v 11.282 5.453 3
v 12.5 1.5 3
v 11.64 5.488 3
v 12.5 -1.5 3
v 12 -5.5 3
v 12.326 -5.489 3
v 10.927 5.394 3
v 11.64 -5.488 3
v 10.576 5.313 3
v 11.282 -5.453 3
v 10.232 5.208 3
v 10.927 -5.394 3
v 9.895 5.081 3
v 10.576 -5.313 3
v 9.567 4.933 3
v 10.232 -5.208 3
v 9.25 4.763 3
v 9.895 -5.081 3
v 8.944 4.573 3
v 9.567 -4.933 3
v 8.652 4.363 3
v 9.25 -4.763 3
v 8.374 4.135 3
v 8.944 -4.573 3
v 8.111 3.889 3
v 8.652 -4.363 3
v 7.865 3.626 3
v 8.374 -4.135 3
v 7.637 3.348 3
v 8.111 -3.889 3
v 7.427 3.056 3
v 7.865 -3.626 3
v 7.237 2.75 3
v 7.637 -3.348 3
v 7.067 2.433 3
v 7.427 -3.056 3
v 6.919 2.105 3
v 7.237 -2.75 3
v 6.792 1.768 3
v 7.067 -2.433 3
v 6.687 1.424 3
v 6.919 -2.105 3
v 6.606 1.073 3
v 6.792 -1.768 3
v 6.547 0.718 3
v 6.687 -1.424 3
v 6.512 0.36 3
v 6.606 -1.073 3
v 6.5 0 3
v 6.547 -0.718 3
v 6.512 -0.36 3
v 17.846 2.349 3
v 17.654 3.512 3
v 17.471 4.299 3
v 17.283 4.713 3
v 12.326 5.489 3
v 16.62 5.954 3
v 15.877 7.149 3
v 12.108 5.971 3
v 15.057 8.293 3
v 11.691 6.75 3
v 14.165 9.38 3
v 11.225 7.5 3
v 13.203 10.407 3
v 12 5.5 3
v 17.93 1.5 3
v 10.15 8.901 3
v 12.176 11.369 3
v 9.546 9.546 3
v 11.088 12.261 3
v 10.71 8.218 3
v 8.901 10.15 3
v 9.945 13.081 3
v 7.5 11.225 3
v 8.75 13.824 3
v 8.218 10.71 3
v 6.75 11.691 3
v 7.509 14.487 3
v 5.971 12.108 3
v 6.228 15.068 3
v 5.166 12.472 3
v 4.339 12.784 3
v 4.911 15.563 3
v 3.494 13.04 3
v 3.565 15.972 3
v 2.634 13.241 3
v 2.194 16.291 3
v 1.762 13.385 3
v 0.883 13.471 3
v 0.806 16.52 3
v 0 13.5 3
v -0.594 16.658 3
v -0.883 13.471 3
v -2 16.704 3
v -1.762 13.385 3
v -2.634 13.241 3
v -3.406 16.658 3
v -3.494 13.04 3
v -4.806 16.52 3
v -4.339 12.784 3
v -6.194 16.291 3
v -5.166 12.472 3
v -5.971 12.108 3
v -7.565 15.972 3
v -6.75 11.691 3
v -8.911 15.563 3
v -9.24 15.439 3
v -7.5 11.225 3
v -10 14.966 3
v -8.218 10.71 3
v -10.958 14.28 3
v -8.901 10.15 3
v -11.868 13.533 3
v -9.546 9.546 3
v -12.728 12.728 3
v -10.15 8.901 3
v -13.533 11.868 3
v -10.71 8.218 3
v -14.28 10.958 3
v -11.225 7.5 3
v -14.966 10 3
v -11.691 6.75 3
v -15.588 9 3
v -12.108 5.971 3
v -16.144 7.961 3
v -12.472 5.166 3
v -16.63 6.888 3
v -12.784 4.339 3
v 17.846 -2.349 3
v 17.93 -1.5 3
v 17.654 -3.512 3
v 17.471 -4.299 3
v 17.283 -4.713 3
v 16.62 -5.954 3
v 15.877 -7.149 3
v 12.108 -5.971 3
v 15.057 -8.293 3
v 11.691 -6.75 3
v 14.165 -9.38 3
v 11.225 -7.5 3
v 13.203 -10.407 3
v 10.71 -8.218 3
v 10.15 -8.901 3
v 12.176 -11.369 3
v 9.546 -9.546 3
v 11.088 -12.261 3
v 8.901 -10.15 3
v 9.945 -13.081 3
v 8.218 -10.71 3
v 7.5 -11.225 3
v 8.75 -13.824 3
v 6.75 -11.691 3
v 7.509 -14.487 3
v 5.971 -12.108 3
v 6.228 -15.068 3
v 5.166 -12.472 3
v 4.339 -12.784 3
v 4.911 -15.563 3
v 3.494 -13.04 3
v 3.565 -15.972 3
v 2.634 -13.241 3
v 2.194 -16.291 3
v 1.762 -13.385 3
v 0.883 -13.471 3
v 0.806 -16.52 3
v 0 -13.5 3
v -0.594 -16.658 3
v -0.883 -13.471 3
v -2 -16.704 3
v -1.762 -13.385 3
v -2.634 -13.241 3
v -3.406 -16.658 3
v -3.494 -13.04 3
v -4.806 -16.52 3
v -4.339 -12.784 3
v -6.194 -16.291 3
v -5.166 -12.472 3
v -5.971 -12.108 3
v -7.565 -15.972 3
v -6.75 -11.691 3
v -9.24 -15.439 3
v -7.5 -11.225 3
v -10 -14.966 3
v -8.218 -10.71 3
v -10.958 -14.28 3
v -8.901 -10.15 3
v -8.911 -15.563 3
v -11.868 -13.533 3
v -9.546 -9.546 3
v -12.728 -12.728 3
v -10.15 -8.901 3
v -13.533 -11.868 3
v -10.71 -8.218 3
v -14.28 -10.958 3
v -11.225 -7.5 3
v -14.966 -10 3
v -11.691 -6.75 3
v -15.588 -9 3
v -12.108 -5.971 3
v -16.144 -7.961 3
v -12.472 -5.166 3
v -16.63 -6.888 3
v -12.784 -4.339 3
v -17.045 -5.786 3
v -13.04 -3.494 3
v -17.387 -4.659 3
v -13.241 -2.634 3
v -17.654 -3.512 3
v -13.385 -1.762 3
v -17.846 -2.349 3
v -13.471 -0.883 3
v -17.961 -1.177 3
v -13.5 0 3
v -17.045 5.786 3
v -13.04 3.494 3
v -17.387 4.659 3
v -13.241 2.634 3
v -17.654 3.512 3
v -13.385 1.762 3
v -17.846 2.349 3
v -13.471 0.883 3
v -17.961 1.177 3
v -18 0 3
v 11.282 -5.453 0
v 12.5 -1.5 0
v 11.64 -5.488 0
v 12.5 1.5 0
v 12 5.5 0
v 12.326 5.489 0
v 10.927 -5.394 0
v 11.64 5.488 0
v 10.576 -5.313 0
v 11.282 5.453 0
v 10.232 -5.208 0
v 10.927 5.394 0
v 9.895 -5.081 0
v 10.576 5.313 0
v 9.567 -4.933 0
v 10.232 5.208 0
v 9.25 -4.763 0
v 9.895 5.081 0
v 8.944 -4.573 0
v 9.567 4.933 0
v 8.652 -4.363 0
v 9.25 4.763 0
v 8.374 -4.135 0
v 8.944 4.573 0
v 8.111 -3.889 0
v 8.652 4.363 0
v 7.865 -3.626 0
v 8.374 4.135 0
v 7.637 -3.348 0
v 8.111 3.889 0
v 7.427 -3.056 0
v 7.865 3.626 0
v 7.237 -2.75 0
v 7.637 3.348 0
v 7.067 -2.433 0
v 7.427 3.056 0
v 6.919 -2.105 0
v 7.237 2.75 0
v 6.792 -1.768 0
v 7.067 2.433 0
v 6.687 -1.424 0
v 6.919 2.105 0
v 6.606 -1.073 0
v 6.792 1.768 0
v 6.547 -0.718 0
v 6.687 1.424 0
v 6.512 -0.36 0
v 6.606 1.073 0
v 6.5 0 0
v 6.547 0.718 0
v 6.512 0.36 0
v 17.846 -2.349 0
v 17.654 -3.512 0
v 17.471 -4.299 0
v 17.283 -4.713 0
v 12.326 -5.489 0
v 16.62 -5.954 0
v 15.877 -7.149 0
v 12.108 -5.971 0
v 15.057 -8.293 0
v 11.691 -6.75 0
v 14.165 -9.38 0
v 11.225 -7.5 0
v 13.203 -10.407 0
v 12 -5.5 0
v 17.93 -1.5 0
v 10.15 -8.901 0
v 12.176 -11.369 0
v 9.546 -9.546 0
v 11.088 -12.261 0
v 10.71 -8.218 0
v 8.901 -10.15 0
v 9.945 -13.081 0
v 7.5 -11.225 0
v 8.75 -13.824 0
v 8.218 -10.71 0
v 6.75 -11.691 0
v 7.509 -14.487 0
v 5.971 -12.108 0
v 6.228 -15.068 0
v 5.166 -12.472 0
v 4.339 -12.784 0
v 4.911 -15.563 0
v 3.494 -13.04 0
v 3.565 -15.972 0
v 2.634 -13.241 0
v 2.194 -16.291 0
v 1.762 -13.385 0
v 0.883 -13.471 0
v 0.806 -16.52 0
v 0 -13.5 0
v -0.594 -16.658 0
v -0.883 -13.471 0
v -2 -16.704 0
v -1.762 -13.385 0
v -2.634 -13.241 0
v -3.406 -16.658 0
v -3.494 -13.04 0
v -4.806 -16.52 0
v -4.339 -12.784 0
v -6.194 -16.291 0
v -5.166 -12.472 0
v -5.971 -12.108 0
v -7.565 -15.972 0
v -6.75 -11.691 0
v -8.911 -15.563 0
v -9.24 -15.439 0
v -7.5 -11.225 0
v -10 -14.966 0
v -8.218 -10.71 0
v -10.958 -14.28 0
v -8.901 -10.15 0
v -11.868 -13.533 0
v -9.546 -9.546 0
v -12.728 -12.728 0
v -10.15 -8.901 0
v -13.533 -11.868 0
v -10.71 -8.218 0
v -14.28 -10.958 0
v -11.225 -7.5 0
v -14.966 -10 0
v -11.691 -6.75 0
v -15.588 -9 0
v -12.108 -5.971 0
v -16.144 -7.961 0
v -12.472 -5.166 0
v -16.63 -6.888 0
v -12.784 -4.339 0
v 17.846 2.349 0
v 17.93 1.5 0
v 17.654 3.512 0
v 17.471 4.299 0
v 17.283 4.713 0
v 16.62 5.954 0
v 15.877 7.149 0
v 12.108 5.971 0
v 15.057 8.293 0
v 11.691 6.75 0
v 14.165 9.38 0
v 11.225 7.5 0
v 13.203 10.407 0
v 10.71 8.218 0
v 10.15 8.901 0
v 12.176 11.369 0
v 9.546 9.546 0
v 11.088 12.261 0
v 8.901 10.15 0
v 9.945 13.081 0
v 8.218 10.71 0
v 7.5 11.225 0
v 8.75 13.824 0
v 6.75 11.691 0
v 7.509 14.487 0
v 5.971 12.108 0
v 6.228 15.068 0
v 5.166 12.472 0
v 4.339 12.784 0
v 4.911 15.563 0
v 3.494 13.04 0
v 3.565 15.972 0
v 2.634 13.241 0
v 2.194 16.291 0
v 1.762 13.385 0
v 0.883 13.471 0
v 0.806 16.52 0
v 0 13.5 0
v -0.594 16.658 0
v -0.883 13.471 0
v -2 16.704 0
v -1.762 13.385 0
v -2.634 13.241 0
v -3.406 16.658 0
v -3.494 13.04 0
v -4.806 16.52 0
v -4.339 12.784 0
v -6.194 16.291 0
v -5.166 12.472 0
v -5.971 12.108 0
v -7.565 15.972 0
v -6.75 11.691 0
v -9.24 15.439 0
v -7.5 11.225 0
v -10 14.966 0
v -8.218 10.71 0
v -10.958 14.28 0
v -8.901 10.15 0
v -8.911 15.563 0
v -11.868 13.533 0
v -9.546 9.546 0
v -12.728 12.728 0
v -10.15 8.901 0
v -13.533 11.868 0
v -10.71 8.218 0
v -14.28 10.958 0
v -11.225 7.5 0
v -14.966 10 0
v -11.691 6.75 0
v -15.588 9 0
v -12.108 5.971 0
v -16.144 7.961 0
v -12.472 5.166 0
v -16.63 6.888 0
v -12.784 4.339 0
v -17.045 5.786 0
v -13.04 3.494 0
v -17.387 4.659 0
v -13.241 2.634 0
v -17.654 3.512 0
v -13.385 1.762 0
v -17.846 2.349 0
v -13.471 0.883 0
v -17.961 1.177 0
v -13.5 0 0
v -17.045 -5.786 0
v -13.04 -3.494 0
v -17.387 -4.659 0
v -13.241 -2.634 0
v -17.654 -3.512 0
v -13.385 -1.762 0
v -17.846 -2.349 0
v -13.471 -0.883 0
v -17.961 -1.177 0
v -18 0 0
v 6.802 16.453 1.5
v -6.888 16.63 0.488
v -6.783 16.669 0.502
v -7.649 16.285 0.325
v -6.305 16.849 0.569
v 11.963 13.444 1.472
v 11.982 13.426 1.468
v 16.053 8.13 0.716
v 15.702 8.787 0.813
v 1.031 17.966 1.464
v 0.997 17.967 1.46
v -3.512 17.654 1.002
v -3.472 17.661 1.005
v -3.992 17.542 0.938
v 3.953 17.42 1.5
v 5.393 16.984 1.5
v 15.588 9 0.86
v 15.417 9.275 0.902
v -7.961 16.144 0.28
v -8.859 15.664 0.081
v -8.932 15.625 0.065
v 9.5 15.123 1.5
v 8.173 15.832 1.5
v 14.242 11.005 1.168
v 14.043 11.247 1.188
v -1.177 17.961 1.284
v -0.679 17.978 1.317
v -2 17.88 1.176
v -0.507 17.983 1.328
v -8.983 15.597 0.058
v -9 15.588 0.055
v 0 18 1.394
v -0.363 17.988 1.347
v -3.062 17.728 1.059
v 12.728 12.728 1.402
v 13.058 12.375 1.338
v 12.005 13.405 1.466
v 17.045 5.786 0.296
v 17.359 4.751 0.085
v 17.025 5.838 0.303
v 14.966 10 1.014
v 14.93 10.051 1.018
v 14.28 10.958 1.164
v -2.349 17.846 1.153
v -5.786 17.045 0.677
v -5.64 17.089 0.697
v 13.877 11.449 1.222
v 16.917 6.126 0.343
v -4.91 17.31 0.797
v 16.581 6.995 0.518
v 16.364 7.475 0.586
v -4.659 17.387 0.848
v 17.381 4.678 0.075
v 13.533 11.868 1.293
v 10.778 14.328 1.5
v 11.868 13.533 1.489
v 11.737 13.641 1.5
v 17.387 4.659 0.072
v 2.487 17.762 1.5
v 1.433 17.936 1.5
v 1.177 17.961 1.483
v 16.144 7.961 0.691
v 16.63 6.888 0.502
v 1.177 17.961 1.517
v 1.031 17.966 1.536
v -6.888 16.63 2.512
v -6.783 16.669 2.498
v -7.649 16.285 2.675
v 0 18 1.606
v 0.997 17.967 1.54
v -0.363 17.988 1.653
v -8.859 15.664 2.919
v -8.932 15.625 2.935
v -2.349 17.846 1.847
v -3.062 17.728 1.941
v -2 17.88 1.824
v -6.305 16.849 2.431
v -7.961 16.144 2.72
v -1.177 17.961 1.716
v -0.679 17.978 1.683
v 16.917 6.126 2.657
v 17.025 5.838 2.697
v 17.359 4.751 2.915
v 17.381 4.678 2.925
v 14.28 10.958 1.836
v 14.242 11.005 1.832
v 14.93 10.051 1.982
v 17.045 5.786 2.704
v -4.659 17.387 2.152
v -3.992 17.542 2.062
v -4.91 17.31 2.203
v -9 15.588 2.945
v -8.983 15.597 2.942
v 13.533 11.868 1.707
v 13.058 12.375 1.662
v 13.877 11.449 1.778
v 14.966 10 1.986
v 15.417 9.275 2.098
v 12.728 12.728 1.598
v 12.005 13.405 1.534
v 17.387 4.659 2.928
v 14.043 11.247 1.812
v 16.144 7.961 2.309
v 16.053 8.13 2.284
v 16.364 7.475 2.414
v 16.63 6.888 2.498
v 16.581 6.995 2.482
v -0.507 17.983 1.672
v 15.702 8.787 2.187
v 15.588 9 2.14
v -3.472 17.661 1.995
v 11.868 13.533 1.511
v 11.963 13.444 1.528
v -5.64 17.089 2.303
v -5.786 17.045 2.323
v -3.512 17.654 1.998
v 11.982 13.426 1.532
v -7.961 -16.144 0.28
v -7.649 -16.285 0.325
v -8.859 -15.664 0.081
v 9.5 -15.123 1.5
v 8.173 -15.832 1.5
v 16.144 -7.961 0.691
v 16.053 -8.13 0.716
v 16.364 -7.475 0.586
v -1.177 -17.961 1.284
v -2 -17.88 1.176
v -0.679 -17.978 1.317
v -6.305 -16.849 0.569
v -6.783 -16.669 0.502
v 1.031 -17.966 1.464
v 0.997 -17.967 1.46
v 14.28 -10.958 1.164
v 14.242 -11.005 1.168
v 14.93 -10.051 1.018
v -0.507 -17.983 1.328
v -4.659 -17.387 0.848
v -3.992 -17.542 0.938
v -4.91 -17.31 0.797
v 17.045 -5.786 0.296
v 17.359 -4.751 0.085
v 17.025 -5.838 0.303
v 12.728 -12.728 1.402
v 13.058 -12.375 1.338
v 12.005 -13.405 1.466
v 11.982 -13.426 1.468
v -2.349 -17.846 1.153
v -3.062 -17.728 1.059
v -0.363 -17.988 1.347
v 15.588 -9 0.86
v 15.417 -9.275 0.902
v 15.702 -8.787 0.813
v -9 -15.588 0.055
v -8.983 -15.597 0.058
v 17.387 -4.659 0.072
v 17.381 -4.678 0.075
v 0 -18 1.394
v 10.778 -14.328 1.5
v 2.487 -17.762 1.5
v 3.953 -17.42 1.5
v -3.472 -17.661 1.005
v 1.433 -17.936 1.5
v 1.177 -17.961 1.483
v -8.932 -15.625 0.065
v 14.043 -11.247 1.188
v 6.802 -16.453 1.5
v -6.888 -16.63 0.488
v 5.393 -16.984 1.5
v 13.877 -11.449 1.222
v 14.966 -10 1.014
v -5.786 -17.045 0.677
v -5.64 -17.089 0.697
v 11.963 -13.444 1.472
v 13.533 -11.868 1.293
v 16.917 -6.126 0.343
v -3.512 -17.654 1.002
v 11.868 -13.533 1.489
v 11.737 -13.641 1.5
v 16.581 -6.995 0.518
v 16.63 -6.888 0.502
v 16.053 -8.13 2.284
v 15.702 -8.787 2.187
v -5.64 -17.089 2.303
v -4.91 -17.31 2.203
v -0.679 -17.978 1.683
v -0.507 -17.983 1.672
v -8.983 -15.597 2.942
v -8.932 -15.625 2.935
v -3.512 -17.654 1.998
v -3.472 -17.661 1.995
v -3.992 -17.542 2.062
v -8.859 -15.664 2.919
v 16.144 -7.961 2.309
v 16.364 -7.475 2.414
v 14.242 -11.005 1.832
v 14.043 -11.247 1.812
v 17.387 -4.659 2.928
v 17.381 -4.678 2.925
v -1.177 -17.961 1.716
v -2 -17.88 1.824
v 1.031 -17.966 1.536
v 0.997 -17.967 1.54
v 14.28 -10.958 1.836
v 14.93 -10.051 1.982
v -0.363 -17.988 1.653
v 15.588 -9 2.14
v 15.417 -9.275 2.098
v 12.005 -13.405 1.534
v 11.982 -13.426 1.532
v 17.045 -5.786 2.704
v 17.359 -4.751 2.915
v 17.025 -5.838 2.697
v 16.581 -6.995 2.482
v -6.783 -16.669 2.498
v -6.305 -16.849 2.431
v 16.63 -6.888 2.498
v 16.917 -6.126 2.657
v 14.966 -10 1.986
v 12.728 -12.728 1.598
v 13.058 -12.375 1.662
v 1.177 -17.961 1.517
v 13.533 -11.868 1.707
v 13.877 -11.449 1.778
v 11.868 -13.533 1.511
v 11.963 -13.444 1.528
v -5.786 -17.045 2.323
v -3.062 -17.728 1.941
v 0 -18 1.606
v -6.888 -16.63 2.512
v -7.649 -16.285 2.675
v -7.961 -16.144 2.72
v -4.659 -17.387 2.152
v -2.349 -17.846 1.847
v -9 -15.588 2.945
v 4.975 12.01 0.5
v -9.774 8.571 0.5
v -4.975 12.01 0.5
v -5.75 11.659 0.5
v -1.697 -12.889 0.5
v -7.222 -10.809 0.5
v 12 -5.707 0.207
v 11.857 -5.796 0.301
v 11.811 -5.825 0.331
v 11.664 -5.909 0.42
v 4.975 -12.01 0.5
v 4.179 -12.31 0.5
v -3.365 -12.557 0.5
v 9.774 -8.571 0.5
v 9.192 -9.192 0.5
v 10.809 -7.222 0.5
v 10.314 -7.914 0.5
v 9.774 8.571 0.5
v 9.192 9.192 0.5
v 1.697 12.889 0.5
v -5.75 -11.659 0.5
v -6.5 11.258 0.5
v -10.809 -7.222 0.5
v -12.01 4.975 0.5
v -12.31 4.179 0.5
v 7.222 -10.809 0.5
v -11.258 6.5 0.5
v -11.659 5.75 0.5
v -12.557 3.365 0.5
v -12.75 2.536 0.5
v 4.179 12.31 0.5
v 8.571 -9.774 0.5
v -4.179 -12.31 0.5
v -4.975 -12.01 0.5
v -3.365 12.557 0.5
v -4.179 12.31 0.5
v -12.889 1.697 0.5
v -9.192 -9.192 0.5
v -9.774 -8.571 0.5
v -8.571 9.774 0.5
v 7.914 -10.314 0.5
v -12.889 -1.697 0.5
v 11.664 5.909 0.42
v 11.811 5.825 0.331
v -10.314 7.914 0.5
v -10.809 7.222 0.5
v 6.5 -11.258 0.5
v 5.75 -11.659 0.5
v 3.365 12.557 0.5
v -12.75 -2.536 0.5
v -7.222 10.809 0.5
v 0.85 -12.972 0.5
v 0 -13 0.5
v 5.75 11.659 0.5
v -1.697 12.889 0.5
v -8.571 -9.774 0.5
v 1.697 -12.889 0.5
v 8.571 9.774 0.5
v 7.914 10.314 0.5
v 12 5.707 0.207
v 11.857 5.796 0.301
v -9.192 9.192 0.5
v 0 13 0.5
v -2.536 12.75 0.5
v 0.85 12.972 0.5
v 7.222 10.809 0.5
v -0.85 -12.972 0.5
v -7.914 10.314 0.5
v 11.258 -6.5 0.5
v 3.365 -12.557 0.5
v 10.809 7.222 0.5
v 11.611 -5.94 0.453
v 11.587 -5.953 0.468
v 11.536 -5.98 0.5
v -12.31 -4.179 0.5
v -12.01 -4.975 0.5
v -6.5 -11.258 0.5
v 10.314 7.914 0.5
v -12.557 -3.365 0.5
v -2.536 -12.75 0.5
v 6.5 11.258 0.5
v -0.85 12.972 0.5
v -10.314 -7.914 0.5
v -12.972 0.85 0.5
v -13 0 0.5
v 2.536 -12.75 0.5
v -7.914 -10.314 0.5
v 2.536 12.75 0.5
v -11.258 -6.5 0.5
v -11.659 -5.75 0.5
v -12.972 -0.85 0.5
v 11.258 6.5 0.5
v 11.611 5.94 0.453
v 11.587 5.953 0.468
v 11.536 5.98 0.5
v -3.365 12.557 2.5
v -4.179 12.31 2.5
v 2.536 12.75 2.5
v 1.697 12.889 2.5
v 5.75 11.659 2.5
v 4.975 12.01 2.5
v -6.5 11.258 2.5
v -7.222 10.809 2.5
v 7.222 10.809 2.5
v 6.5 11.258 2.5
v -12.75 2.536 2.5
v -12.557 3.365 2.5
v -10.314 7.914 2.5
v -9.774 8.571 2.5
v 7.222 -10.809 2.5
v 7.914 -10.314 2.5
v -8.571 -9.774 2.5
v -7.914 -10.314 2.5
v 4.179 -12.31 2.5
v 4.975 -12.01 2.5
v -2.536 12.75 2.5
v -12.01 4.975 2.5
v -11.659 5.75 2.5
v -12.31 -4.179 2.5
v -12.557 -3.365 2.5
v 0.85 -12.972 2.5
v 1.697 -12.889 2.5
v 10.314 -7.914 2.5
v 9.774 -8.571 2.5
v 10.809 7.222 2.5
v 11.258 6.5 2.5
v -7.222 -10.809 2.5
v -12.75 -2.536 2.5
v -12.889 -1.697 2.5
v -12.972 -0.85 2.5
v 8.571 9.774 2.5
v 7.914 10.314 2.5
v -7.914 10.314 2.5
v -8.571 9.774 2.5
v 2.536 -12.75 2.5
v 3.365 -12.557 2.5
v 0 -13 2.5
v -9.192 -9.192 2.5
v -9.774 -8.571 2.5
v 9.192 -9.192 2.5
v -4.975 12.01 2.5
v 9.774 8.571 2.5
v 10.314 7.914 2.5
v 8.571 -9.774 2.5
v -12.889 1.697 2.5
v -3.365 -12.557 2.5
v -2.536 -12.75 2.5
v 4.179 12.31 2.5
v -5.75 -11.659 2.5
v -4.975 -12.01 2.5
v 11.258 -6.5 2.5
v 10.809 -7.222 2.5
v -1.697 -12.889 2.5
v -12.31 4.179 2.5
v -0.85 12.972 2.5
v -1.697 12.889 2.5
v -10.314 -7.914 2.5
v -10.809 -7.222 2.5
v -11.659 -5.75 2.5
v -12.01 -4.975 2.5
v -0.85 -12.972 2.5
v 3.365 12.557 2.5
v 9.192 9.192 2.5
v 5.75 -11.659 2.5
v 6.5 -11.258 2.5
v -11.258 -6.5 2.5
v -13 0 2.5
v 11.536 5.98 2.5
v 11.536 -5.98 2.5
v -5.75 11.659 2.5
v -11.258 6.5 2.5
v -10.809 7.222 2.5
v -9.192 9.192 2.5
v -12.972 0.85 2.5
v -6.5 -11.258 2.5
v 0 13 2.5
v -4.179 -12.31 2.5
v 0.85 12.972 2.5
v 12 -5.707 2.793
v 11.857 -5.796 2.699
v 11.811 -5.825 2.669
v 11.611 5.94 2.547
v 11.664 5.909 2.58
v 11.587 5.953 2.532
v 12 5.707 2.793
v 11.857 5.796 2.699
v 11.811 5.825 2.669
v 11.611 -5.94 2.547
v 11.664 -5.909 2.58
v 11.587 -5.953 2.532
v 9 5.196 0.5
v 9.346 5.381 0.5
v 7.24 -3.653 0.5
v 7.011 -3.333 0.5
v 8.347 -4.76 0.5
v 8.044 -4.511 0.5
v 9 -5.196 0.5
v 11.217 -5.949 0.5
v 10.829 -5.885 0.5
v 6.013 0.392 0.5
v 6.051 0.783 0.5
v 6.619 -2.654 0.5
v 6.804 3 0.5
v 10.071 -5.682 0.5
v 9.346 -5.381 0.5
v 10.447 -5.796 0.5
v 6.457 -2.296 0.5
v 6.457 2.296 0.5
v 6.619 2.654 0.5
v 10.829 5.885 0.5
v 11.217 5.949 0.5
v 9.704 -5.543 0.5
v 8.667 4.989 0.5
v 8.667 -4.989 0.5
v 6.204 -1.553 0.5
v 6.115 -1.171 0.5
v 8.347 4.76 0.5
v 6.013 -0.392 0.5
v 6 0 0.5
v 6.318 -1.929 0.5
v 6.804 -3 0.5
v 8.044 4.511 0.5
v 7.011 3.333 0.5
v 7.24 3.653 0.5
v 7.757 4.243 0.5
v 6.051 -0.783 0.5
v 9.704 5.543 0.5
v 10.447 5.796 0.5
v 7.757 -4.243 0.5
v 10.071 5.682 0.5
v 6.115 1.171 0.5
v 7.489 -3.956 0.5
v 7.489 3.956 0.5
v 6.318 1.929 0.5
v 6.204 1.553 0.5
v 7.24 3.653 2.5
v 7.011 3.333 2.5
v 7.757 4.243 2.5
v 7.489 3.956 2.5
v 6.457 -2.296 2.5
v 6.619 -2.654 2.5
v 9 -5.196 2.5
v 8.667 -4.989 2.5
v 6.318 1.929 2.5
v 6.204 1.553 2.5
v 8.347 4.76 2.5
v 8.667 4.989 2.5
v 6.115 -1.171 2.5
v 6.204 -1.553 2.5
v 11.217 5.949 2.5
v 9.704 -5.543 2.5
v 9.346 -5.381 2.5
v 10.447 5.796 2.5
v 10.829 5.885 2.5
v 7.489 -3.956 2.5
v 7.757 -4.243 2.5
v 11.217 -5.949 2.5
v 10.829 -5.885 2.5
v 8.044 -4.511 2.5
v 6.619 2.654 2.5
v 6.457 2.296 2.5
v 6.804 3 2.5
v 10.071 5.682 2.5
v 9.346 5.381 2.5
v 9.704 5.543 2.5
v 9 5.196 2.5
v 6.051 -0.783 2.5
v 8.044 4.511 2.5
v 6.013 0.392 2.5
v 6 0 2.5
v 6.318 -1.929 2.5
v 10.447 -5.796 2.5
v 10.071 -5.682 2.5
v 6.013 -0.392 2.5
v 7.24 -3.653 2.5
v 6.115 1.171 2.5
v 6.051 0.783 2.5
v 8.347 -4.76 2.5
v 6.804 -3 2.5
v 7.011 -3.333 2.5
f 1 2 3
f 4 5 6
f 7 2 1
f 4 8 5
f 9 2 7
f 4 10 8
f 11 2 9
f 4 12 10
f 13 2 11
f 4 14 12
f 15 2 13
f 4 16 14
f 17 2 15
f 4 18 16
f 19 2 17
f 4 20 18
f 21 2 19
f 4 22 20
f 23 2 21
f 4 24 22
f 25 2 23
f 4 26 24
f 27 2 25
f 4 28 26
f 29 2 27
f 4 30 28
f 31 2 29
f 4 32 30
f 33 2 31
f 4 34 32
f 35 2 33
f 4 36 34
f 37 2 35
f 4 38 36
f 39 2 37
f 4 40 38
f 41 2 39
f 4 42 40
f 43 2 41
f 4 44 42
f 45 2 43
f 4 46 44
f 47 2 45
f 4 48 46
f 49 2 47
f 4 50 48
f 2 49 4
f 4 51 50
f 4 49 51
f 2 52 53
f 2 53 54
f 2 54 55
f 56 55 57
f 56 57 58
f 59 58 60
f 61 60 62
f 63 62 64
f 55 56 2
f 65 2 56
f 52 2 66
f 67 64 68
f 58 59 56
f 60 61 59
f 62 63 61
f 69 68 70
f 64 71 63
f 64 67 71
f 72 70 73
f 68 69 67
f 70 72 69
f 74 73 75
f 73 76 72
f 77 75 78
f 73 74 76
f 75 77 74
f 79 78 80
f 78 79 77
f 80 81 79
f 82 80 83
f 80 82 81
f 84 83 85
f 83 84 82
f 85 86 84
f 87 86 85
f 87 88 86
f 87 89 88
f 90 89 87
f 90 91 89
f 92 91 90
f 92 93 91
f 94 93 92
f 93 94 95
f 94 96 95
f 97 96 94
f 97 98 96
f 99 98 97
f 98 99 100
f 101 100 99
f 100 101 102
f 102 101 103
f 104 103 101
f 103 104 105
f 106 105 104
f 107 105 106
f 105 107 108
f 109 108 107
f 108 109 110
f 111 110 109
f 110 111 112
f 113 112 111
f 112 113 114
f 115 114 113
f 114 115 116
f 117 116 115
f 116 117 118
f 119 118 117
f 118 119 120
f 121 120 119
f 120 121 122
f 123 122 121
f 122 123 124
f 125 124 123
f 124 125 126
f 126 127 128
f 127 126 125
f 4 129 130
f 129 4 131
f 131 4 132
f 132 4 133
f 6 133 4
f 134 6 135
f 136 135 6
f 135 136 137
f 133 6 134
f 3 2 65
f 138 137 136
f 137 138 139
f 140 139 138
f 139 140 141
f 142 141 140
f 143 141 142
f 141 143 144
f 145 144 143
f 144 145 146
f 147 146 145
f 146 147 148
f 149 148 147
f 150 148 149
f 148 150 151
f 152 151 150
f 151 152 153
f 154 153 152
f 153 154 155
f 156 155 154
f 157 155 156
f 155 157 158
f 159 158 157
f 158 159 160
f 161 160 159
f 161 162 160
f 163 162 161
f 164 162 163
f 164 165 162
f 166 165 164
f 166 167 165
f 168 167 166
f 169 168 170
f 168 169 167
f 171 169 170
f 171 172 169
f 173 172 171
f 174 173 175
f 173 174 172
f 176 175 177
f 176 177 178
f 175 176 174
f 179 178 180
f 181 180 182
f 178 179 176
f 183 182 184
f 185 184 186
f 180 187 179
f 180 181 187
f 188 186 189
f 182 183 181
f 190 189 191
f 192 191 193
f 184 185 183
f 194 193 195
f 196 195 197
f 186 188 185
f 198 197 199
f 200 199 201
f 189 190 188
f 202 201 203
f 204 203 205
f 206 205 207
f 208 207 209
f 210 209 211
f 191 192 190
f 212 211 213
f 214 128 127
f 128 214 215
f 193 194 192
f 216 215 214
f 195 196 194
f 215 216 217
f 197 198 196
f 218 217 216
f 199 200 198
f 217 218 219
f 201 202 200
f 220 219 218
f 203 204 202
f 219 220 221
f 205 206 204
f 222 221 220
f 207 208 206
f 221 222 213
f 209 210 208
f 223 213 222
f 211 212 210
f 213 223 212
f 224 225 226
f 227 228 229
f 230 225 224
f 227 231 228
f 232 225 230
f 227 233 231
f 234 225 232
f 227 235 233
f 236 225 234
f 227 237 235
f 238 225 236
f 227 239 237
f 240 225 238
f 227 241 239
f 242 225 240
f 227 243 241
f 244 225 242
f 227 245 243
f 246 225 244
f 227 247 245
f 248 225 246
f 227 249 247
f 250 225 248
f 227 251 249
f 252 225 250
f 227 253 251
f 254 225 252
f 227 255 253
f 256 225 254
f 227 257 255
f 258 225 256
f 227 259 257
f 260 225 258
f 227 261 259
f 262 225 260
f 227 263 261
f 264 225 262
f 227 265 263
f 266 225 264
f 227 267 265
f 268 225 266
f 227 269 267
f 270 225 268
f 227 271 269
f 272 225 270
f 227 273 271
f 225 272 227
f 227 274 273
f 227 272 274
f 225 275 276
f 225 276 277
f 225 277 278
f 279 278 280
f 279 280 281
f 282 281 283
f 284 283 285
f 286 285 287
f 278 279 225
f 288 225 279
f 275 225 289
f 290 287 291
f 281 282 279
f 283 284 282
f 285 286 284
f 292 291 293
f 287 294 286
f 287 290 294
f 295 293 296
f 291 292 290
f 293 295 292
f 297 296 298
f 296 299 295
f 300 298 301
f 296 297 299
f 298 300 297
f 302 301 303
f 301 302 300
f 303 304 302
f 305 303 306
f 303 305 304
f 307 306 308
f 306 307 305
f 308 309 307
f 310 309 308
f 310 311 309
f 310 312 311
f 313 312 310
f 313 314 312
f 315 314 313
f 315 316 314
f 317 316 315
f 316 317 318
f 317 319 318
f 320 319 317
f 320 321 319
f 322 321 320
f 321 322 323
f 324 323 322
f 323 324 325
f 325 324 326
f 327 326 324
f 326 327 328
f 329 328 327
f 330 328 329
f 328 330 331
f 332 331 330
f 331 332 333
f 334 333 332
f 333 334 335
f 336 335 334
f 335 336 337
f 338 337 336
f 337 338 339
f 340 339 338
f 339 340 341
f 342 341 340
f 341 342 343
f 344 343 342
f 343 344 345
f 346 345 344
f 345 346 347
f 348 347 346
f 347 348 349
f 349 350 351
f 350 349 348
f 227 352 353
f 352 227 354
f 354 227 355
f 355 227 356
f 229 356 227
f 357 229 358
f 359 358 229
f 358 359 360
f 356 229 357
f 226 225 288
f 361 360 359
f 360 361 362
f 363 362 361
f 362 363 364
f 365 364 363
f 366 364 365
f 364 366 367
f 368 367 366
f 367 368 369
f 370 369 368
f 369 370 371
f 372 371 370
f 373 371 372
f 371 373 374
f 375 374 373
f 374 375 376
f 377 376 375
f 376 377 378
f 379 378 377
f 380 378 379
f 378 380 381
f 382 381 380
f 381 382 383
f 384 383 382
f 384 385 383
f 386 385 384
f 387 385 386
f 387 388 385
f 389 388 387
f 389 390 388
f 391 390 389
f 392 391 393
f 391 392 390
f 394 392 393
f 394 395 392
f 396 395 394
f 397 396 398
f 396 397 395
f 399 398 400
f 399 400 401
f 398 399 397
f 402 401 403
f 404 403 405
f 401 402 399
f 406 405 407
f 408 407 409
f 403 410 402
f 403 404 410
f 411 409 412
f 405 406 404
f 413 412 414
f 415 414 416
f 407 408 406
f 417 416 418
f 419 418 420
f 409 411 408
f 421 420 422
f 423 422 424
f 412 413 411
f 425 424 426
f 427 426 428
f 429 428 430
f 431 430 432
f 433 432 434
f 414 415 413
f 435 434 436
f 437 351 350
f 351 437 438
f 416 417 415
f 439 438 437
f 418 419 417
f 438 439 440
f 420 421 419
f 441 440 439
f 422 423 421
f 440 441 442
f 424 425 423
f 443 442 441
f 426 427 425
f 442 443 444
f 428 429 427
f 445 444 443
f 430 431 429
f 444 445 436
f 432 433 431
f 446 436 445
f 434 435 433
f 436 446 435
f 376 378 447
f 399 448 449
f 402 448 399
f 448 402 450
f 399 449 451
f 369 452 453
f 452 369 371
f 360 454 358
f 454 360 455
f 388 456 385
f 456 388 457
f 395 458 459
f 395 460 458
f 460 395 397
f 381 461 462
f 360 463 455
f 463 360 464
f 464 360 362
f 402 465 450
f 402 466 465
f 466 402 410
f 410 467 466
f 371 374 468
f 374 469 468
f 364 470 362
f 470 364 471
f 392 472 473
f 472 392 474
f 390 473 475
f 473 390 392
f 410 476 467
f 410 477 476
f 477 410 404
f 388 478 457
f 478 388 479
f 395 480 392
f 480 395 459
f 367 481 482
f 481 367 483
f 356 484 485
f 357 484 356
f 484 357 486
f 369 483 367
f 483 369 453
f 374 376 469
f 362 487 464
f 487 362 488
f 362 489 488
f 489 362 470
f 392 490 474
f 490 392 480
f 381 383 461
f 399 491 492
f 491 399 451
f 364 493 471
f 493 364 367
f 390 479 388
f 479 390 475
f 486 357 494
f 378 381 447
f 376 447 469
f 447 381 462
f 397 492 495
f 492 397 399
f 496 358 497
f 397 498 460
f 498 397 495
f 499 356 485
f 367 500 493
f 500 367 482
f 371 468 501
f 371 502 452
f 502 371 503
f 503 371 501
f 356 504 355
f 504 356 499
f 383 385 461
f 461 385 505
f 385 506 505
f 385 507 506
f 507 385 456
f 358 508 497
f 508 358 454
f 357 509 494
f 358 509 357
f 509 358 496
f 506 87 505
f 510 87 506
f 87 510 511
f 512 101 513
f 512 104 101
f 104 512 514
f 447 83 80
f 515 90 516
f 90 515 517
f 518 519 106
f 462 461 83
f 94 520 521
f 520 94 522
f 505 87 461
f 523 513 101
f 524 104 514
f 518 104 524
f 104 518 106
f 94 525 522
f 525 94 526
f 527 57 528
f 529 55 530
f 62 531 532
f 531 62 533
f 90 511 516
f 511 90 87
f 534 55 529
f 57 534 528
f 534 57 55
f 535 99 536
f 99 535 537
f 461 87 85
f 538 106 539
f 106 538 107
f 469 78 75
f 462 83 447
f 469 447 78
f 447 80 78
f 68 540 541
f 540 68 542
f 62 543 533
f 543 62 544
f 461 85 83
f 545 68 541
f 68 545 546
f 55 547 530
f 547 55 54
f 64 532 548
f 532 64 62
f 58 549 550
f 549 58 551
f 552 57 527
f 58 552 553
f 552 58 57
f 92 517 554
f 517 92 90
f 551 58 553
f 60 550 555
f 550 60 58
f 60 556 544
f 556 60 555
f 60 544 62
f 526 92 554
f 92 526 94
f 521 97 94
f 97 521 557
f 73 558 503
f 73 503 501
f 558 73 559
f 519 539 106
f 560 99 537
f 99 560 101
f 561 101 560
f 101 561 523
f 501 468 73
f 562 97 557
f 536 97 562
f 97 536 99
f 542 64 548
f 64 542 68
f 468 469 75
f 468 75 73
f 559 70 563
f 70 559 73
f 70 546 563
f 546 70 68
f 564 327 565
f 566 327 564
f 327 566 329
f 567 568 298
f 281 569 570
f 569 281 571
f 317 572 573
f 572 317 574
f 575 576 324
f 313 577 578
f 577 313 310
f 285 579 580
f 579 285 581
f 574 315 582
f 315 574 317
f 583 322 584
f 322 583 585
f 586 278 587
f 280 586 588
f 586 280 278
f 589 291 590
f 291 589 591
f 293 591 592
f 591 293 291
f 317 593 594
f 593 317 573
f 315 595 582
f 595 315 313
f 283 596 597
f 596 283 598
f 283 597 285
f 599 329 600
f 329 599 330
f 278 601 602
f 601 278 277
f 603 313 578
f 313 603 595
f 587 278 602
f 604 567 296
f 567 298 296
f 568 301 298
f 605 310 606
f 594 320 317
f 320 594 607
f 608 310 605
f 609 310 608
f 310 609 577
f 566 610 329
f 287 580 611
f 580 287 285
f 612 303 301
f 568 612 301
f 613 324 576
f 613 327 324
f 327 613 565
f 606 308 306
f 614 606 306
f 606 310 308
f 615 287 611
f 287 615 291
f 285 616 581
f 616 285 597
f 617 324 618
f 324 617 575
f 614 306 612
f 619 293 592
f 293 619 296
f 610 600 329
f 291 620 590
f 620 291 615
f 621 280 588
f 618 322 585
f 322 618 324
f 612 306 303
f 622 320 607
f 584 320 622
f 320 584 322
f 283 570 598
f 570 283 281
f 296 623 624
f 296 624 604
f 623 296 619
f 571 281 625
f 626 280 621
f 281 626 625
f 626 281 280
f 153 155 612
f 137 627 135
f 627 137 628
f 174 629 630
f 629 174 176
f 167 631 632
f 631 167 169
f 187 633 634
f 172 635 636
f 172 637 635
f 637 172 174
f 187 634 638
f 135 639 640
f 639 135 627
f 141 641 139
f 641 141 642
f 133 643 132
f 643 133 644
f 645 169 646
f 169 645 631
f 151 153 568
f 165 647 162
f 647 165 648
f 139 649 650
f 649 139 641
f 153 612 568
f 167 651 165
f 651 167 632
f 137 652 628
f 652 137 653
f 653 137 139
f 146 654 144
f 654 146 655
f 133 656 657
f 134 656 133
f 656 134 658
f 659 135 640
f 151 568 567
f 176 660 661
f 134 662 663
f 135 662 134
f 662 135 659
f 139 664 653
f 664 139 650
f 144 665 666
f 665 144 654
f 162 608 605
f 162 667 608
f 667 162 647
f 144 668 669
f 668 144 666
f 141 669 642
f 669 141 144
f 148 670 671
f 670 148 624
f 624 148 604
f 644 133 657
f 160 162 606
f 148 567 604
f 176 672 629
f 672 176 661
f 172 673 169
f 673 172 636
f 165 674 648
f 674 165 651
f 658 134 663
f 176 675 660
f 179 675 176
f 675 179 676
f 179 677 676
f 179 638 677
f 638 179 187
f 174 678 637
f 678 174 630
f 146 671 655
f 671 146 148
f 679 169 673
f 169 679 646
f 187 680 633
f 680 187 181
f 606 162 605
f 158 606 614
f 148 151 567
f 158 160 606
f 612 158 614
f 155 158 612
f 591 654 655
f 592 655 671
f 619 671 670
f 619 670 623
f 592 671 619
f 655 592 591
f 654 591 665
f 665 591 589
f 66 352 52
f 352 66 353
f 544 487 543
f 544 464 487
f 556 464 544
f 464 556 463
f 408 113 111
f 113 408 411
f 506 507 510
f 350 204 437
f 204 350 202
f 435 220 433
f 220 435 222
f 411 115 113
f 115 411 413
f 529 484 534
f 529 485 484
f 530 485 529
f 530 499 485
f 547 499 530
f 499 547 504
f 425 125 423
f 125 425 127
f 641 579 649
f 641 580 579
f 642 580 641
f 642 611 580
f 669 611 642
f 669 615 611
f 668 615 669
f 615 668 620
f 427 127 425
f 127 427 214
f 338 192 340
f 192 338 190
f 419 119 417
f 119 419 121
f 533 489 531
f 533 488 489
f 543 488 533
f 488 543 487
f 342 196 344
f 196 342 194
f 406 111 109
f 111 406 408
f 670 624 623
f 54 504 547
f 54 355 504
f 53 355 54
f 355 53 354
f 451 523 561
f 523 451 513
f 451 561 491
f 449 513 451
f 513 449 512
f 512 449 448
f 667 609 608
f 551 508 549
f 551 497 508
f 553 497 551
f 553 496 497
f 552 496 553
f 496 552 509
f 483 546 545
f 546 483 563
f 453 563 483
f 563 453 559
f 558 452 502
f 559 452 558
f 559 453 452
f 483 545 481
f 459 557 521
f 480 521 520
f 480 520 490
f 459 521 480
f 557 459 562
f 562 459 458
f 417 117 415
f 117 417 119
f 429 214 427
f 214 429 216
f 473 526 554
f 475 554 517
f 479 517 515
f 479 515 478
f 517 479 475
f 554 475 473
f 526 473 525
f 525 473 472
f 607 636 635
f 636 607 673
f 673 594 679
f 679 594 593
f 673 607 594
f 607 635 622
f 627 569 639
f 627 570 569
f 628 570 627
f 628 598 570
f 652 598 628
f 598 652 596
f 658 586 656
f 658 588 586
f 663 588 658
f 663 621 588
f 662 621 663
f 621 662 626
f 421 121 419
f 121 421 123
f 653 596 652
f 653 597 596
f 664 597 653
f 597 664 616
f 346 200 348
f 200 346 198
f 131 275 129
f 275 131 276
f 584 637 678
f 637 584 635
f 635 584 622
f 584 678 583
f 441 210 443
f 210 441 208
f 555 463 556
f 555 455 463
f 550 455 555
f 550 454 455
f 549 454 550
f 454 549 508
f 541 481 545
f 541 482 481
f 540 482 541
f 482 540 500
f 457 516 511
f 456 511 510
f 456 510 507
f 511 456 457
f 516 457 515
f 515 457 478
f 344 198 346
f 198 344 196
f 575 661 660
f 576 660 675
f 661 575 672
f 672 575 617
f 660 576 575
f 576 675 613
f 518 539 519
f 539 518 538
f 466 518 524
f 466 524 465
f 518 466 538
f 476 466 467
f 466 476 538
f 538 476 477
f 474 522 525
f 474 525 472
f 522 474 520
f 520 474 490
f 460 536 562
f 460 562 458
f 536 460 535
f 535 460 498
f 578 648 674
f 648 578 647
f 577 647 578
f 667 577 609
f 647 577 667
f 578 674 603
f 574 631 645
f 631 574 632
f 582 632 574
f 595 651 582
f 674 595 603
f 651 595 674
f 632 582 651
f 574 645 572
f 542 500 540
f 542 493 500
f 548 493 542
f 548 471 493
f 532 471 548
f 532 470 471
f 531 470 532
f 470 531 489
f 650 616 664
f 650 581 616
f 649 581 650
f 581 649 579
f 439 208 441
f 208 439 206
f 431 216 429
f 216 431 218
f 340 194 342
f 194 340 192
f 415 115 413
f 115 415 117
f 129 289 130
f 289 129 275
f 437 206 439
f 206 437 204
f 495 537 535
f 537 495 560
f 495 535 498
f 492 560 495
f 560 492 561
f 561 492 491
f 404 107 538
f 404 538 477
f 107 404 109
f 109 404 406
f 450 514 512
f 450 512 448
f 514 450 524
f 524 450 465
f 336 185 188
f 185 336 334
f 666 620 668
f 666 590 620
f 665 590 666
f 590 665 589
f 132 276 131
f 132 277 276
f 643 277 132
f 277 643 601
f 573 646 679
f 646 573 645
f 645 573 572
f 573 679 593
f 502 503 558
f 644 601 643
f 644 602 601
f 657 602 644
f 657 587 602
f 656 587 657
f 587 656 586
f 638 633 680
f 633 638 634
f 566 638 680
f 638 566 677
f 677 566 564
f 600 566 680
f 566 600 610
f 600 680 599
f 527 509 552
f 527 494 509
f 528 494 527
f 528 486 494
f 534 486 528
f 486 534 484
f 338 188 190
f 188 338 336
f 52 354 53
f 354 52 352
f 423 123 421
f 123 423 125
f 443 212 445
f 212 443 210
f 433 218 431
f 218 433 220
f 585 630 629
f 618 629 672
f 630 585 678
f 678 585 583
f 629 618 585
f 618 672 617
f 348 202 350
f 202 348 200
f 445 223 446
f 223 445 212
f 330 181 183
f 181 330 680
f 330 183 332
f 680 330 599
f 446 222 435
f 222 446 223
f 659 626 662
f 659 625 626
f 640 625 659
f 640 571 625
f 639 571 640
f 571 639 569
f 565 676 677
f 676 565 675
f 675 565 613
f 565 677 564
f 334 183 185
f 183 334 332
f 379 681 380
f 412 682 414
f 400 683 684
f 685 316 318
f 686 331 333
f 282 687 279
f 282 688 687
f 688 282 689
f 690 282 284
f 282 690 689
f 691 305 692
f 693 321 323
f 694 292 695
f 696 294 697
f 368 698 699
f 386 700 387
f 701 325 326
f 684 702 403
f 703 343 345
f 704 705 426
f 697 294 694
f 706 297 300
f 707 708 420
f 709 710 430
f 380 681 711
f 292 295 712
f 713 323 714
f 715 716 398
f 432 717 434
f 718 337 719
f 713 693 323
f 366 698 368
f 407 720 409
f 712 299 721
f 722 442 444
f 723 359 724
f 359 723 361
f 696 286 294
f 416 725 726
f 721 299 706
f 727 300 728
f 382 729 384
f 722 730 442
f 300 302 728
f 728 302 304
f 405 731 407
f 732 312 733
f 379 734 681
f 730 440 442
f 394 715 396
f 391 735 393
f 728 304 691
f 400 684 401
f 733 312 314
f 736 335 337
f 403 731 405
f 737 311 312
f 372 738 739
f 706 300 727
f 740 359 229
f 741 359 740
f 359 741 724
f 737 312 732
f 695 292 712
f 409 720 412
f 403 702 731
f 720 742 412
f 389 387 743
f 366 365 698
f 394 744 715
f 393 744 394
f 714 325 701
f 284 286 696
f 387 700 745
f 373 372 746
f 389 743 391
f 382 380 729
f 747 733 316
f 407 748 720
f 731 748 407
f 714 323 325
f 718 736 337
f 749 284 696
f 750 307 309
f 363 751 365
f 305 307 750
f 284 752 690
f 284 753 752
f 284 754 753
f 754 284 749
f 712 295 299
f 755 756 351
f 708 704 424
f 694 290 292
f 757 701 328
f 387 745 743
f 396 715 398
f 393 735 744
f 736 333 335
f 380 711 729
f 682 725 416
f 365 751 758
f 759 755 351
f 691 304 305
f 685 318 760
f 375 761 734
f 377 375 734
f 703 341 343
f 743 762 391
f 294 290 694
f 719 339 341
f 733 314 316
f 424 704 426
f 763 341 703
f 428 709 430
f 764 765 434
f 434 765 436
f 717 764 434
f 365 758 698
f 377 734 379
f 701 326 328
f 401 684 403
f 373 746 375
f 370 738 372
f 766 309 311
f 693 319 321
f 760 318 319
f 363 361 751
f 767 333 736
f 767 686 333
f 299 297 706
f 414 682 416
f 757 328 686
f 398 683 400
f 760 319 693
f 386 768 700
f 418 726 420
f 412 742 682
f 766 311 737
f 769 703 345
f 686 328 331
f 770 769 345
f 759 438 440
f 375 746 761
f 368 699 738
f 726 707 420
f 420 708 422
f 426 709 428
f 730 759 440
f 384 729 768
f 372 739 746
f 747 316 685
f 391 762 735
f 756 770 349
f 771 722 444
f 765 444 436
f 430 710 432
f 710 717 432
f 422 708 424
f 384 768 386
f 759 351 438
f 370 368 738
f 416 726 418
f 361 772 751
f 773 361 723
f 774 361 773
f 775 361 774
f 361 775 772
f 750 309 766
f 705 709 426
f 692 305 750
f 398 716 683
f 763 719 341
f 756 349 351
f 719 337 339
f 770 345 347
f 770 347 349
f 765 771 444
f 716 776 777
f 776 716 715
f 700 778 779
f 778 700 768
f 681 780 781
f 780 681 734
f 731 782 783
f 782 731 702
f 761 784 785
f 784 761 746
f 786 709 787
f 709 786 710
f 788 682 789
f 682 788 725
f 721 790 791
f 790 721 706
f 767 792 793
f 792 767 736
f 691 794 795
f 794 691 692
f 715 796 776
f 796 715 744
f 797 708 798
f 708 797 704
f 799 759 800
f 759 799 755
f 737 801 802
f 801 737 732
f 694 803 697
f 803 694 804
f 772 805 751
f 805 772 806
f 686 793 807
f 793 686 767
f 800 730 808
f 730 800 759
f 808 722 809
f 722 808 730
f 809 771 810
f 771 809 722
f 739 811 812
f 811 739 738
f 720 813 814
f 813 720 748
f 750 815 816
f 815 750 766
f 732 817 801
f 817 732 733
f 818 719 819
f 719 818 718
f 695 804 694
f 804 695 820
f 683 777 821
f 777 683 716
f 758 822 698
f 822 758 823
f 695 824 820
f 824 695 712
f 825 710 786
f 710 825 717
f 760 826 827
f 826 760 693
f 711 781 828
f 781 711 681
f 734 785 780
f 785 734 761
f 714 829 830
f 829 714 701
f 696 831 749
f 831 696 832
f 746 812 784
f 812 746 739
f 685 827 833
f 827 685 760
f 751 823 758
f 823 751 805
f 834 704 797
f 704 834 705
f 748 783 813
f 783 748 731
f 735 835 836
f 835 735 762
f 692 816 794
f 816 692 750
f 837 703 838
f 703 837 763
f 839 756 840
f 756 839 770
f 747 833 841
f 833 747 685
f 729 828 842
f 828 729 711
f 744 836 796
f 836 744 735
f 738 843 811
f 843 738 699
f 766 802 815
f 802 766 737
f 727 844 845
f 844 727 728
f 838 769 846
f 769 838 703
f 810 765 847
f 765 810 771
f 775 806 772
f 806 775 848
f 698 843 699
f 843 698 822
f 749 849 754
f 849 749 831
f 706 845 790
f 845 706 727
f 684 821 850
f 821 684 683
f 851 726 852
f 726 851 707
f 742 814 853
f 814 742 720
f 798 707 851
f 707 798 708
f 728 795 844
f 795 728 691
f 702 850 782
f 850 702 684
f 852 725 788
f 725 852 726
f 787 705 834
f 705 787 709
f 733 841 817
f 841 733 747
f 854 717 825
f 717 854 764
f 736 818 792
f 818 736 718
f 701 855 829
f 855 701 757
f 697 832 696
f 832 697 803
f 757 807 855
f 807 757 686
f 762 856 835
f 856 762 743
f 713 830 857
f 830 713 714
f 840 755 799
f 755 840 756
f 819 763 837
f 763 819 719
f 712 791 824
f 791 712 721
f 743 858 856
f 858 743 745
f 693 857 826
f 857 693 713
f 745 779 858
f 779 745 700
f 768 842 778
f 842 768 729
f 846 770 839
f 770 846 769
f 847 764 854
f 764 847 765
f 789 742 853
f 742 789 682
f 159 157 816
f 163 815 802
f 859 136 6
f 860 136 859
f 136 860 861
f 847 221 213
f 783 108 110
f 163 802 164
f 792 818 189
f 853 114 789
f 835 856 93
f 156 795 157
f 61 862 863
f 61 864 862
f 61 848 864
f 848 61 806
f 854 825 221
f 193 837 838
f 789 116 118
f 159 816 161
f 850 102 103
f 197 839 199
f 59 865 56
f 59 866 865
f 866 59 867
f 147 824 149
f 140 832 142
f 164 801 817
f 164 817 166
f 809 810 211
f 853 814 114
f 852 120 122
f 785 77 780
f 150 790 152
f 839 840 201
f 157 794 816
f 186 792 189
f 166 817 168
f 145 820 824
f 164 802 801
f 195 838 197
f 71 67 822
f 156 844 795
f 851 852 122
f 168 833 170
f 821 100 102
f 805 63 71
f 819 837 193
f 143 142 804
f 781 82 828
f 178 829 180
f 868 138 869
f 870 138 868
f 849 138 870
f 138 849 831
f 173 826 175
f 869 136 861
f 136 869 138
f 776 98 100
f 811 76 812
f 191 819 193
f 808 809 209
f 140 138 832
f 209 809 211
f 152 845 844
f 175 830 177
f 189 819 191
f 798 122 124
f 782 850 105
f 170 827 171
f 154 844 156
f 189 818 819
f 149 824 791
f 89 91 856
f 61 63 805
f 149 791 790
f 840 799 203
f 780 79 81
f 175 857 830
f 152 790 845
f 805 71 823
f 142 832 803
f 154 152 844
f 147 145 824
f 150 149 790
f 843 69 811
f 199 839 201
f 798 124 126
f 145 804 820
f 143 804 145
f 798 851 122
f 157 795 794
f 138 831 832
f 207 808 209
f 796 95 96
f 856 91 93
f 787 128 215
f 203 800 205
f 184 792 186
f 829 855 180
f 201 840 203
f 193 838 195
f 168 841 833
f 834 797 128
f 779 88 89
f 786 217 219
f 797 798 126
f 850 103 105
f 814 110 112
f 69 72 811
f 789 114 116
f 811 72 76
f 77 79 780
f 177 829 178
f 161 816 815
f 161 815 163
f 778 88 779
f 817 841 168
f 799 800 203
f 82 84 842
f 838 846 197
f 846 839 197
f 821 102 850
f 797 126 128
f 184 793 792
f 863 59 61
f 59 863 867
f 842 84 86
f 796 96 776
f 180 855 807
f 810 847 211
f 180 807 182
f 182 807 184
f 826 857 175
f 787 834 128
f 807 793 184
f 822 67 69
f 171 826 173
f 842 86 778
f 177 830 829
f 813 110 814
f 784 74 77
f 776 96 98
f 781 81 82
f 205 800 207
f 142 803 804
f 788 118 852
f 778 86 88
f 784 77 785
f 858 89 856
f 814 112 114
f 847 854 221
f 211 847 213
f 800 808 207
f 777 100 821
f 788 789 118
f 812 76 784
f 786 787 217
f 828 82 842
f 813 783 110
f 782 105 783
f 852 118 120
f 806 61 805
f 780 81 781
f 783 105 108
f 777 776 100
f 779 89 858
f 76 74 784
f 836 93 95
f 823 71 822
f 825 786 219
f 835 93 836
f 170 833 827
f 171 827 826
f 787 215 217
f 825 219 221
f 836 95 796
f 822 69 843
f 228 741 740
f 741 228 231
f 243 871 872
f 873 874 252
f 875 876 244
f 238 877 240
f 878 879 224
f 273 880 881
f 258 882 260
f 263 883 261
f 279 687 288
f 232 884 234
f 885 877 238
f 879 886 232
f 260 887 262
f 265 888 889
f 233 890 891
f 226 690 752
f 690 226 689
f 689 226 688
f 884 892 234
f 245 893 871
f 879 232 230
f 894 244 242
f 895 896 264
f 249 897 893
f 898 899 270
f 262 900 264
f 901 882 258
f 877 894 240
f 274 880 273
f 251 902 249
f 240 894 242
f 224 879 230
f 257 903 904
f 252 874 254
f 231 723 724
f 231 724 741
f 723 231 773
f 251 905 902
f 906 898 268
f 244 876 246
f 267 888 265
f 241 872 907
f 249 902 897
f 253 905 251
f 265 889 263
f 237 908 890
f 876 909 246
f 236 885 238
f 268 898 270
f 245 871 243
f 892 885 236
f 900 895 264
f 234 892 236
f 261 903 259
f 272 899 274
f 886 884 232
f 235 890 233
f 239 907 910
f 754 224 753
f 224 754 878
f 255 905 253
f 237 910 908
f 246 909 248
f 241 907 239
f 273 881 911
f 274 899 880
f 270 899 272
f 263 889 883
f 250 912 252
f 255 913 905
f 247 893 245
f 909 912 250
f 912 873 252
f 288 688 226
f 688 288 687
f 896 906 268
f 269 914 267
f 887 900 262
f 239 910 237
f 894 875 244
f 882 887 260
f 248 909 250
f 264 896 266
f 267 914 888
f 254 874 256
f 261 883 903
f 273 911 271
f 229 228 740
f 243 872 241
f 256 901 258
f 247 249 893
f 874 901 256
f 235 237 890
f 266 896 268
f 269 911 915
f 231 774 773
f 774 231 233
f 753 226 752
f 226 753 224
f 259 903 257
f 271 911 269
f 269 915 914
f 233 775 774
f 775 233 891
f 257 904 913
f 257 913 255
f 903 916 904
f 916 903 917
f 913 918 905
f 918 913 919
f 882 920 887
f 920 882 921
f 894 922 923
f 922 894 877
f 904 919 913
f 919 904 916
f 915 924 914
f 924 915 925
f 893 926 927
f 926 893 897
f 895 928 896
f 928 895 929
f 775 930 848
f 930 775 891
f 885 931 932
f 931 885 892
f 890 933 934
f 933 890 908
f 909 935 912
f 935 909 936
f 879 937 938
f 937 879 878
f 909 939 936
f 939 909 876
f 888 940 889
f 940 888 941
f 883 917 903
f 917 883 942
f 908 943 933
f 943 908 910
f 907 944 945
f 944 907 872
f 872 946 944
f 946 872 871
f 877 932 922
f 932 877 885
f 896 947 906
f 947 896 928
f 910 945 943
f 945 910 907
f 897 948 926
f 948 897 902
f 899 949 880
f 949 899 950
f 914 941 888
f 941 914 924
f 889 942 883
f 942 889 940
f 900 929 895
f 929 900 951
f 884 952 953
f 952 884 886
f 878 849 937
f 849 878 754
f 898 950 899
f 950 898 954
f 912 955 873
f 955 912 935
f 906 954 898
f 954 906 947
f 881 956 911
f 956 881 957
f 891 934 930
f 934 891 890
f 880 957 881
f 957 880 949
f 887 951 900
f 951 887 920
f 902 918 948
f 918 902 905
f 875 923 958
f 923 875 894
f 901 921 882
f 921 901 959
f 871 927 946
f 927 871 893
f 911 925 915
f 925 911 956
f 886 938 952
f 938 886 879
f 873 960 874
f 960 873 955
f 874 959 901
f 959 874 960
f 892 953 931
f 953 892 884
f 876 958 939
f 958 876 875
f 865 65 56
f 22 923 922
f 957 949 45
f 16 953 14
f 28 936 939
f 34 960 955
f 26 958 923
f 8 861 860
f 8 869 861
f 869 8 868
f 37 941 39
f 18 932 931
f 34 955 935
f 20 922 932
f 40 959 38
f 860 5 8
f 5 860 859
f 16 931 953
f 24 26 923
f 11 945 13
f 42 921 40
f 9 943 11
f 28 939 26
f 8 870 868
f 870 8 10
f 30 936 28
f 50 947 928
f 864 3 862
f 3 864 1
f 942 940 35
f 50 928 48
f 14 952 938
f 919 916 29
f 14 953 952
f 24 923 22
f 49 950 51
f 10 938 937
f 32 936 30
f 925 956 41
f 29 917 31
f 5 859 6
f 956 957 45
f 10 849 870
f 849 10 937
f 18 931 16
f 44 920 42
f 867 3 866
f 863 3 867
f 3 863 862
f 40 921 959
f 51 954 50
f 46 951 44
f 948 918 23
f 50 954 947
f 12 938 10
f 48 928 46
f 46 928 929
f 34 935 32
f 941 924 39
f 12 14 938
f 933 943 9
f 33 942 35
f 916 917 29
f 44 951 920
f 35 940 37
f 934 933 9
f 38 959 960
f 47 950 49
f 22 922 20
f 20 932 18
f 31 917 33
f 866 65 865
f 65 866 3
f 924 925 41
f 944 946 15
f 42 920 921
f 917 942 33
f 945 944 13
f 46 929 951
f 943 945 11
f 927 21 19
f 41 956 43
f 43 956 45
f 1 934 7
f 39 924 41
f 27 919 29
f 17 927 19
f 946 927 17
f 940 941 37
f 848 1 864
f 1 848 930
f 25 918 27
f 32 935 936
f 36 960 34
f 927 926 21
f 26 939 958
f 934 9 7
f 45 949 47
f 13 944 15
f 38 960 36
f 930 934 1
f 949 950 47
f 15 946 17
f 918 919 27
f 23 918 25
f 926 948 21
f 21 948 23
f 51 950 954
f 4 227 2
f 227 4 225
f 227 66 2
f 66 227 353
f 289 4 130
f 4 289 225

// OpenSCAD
// Minimalist Wobbler
// Version 1.0
// Luigi Cisana, 17 May, 2013

outer_diameter=36;

hole_diameter=26;

thickness=3; // [1:5]

/* [Hidden] */
$fn=96;
facet=0.5;

height=thickness;
radius=outer_diameter/2;
iradius=hole_diameter/2;

sradius=radius-iradius+1;
slot=sradius;

x1=2;
y1=sqrt(pow(5,2)-x1);

difference() {
	union() {
		difference() {
			cylinder(h=height,r=radius);	
			translate ([-x1,-y1,0]) difference() {
				cylinder(h=height,r=radius+10);
				cylinder(h=height/2,r1=radius-height/2+5,r2=radius+5);
				translate([0,0,height/2]) cylinder(h=height/2,r1=radius+5,r2=radius-height/2+5);
			}
			translate ([-x1,y1,0]) difference() {
				cylinder(h=height,r=radius+10);
				cylinder(h=height/2,r1=radius-height/2+5,r2=radius+5);
				translate([0,0,height/2]) cylinder(h=height/2,r1=radius+5,r2=radius-height/2+5);
			}
			cylinder(h=facet,r1=iradius+facet,r2=iradius);
			translate ([0,0,facet]) cylinder(h=height-2*facet,r1=iradius,r2=iradius);
			translate ([0,0,height-facet]) cylinder(h=facet,r1=iradius,r2=iradius+facet);
		}
		translate([radius-slot,0,0]) cylinder(h=facet,r1=sradius-facet,r2=sradius);
		translate([radius-slot,0,facet]) cylinder(h=height-2*facet,r=sradius);
		translate([radius-slot,0,height-facet]) cylinder(h=facet,r1=sradius,r2=sradius-facet);
	}  //union
	translate([radius-slot+facet,-height/2,0]) cube(size=[slot,height,height],center=false);
}
